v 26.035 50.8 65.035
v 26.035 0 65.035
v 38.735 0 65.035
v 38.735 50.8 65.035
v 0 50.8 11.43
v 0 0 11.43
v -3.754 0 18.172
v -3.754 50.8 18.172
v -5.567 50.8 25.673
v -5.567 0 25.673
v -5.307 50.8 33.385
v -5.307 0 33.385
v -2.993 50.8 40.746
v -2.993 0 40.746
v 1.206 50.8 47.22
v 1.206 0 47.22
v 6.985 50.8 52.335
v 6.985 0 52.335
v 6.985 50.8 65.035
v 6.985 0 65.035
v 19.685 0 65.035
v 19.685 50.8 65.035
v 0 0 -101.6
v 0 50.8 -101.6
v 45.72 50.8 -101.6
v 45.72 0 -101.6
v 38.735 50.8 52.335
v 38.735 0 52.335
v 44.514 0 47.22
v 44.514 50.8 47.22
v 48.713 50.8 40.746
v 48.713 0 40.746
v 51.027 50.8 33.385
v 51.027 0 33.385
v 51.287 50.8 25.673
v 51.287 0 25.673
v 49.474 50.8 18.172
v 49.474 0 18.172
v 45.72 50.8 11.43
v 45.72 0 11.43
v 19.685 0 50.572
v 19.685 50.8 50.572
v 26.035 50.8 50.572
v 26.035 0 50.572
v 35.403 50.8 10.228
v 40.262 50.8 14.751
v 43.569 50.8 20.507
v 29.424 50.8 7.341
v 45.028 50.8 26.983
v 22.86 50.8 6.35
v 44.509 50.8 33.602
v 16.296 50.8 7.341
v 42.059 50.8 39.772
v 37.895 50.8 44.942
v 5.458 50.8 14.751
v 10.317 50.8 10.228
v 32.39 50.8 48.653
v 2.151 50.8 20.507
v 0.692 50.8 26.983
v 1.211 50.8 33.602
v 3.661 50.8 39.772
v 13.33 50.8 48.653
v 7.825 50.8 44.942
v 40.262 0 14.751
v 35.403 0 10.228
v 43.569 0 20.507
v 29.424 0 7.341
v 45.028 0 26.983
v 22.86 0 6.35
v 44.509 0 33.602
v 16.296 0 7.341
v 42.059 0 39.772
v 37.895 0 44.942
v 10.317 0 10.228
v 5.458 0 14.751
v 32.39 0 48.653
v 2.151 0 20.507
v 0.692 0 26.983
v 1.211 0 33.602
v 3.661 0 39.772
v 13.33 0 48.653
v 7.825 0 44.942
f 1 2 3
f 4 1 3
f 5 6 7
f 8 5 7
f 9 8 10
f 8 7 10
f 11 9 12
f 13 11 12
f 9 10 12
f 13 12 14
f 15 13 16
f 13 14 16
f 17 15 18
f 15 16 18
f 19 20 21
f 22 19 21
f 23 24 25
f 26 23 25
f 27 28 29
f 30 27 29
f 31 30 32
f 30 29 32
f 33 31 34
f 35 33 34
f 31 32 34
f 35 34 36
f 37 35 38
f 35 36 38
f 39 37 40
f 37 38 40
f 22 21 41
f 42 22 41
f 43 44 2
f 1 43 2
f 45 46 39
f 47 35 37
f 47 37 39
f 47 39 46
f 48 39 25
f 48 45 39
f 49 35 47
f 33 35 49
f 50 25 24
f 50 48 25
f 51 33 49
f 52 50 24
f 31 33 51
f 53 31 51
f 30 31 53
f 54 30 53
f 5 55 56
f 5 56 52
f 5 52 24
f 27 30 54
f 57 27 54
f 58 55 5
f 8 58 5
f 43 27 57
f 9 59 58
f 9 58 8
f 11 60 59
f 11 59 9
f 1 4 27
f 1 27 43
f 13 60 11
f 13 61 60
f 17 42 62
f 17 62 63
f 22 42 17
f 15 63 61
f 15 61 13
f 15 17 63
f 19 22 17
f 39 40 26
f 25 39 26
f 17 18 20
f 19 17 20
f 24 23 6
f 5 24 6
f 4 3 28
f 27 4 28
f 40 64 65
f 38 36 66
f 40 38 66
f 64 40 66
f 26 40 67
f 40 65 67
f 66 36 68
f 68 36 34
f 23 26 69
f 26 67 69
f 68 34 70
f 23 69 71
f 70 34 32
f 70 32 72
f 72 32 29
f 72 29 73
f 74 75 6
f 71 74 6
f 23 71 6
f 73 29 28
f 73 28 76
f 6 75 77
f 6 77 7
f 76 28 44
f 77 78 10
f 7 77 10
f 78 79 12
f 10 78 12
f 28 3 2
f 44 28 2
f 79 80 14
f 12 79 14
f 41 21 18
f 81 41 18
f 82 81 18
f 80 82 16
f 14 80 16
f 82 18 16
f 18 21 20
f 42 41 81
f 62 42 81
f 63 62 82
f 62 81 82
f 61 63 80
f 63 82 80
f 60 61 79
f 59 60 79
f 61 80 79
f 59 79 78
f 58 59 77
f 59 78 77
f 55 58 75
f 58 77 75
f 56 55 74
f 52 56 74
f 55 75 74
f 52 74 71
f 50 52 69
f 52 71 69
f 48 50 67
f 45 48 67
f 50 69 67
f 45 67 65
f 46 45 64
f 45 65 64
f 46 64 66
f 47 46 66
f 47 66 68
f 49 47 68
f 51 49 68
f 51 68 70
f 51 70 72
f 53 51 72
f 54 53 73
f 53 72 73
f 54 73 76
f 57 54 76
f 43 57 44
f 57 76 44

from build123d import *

# Parameters (mm, degrees)
SKETCH1_W           = 45.72
SKETCH1_H           = 101.6
BOSS_EXTRUDE1_DEPTH = 50.8
BOSS_EXTRUDE2_DEPTH = 50.8


with BuildPart() as part:
    # Sketch1 → Boss-Extrude1 (new body)
    with BuildSketch(Plane(origin=(0, 0, 0), x_dir=(1, 0, 0), z_dir=(0, 1, 0))):
        with Locations((22.86, 50.8)):
            Rectangle(SKETCH1_W, SKETCH1_H)
    extrude(amount=BOSS_EXTRUDE1_DEPTH)

    # Sketch4 → Boss-Extrude2 (add)
    with BuildSketch(Plane.XZ):
        with BuildLine():
            Line((0, 0), (0, 11.43))
            ThreePointArc((0, 11.43), (-5.307269755, 33.384941739), (6.985, 52.334524406))
            Line((6.985, 52.334524406), (6.985, 65.034524406))
            Line((6.985, 65.034524406), (19.685, 65.034524406))
            Line((19.685, 65.034524406), (19.685, 50.572045256))
            ThreePointArc((19.685, 50.572045256), (22.86, 6.35), (26.035, 50.572045256))
            Line((26.035, 50.572045256), (26.035, 65.034524406))
            Line((26.035, 65.034524406), (38.735, 65.034524406))
            Line((38.735, 65.034524406), (38.735, 52.334524406))
            ThreePointArc((38.735, 52.334524406), (51.027269755, 33.384941739), (45.72, 11.43))
            Line((45.72, 11.43), (45.72, 0))
            Line((45.72, 0), (0, 0))
        make_face()
    extrude(amount=-BOSS_EXTRUDE2_DEPTH)


solid = part.part
